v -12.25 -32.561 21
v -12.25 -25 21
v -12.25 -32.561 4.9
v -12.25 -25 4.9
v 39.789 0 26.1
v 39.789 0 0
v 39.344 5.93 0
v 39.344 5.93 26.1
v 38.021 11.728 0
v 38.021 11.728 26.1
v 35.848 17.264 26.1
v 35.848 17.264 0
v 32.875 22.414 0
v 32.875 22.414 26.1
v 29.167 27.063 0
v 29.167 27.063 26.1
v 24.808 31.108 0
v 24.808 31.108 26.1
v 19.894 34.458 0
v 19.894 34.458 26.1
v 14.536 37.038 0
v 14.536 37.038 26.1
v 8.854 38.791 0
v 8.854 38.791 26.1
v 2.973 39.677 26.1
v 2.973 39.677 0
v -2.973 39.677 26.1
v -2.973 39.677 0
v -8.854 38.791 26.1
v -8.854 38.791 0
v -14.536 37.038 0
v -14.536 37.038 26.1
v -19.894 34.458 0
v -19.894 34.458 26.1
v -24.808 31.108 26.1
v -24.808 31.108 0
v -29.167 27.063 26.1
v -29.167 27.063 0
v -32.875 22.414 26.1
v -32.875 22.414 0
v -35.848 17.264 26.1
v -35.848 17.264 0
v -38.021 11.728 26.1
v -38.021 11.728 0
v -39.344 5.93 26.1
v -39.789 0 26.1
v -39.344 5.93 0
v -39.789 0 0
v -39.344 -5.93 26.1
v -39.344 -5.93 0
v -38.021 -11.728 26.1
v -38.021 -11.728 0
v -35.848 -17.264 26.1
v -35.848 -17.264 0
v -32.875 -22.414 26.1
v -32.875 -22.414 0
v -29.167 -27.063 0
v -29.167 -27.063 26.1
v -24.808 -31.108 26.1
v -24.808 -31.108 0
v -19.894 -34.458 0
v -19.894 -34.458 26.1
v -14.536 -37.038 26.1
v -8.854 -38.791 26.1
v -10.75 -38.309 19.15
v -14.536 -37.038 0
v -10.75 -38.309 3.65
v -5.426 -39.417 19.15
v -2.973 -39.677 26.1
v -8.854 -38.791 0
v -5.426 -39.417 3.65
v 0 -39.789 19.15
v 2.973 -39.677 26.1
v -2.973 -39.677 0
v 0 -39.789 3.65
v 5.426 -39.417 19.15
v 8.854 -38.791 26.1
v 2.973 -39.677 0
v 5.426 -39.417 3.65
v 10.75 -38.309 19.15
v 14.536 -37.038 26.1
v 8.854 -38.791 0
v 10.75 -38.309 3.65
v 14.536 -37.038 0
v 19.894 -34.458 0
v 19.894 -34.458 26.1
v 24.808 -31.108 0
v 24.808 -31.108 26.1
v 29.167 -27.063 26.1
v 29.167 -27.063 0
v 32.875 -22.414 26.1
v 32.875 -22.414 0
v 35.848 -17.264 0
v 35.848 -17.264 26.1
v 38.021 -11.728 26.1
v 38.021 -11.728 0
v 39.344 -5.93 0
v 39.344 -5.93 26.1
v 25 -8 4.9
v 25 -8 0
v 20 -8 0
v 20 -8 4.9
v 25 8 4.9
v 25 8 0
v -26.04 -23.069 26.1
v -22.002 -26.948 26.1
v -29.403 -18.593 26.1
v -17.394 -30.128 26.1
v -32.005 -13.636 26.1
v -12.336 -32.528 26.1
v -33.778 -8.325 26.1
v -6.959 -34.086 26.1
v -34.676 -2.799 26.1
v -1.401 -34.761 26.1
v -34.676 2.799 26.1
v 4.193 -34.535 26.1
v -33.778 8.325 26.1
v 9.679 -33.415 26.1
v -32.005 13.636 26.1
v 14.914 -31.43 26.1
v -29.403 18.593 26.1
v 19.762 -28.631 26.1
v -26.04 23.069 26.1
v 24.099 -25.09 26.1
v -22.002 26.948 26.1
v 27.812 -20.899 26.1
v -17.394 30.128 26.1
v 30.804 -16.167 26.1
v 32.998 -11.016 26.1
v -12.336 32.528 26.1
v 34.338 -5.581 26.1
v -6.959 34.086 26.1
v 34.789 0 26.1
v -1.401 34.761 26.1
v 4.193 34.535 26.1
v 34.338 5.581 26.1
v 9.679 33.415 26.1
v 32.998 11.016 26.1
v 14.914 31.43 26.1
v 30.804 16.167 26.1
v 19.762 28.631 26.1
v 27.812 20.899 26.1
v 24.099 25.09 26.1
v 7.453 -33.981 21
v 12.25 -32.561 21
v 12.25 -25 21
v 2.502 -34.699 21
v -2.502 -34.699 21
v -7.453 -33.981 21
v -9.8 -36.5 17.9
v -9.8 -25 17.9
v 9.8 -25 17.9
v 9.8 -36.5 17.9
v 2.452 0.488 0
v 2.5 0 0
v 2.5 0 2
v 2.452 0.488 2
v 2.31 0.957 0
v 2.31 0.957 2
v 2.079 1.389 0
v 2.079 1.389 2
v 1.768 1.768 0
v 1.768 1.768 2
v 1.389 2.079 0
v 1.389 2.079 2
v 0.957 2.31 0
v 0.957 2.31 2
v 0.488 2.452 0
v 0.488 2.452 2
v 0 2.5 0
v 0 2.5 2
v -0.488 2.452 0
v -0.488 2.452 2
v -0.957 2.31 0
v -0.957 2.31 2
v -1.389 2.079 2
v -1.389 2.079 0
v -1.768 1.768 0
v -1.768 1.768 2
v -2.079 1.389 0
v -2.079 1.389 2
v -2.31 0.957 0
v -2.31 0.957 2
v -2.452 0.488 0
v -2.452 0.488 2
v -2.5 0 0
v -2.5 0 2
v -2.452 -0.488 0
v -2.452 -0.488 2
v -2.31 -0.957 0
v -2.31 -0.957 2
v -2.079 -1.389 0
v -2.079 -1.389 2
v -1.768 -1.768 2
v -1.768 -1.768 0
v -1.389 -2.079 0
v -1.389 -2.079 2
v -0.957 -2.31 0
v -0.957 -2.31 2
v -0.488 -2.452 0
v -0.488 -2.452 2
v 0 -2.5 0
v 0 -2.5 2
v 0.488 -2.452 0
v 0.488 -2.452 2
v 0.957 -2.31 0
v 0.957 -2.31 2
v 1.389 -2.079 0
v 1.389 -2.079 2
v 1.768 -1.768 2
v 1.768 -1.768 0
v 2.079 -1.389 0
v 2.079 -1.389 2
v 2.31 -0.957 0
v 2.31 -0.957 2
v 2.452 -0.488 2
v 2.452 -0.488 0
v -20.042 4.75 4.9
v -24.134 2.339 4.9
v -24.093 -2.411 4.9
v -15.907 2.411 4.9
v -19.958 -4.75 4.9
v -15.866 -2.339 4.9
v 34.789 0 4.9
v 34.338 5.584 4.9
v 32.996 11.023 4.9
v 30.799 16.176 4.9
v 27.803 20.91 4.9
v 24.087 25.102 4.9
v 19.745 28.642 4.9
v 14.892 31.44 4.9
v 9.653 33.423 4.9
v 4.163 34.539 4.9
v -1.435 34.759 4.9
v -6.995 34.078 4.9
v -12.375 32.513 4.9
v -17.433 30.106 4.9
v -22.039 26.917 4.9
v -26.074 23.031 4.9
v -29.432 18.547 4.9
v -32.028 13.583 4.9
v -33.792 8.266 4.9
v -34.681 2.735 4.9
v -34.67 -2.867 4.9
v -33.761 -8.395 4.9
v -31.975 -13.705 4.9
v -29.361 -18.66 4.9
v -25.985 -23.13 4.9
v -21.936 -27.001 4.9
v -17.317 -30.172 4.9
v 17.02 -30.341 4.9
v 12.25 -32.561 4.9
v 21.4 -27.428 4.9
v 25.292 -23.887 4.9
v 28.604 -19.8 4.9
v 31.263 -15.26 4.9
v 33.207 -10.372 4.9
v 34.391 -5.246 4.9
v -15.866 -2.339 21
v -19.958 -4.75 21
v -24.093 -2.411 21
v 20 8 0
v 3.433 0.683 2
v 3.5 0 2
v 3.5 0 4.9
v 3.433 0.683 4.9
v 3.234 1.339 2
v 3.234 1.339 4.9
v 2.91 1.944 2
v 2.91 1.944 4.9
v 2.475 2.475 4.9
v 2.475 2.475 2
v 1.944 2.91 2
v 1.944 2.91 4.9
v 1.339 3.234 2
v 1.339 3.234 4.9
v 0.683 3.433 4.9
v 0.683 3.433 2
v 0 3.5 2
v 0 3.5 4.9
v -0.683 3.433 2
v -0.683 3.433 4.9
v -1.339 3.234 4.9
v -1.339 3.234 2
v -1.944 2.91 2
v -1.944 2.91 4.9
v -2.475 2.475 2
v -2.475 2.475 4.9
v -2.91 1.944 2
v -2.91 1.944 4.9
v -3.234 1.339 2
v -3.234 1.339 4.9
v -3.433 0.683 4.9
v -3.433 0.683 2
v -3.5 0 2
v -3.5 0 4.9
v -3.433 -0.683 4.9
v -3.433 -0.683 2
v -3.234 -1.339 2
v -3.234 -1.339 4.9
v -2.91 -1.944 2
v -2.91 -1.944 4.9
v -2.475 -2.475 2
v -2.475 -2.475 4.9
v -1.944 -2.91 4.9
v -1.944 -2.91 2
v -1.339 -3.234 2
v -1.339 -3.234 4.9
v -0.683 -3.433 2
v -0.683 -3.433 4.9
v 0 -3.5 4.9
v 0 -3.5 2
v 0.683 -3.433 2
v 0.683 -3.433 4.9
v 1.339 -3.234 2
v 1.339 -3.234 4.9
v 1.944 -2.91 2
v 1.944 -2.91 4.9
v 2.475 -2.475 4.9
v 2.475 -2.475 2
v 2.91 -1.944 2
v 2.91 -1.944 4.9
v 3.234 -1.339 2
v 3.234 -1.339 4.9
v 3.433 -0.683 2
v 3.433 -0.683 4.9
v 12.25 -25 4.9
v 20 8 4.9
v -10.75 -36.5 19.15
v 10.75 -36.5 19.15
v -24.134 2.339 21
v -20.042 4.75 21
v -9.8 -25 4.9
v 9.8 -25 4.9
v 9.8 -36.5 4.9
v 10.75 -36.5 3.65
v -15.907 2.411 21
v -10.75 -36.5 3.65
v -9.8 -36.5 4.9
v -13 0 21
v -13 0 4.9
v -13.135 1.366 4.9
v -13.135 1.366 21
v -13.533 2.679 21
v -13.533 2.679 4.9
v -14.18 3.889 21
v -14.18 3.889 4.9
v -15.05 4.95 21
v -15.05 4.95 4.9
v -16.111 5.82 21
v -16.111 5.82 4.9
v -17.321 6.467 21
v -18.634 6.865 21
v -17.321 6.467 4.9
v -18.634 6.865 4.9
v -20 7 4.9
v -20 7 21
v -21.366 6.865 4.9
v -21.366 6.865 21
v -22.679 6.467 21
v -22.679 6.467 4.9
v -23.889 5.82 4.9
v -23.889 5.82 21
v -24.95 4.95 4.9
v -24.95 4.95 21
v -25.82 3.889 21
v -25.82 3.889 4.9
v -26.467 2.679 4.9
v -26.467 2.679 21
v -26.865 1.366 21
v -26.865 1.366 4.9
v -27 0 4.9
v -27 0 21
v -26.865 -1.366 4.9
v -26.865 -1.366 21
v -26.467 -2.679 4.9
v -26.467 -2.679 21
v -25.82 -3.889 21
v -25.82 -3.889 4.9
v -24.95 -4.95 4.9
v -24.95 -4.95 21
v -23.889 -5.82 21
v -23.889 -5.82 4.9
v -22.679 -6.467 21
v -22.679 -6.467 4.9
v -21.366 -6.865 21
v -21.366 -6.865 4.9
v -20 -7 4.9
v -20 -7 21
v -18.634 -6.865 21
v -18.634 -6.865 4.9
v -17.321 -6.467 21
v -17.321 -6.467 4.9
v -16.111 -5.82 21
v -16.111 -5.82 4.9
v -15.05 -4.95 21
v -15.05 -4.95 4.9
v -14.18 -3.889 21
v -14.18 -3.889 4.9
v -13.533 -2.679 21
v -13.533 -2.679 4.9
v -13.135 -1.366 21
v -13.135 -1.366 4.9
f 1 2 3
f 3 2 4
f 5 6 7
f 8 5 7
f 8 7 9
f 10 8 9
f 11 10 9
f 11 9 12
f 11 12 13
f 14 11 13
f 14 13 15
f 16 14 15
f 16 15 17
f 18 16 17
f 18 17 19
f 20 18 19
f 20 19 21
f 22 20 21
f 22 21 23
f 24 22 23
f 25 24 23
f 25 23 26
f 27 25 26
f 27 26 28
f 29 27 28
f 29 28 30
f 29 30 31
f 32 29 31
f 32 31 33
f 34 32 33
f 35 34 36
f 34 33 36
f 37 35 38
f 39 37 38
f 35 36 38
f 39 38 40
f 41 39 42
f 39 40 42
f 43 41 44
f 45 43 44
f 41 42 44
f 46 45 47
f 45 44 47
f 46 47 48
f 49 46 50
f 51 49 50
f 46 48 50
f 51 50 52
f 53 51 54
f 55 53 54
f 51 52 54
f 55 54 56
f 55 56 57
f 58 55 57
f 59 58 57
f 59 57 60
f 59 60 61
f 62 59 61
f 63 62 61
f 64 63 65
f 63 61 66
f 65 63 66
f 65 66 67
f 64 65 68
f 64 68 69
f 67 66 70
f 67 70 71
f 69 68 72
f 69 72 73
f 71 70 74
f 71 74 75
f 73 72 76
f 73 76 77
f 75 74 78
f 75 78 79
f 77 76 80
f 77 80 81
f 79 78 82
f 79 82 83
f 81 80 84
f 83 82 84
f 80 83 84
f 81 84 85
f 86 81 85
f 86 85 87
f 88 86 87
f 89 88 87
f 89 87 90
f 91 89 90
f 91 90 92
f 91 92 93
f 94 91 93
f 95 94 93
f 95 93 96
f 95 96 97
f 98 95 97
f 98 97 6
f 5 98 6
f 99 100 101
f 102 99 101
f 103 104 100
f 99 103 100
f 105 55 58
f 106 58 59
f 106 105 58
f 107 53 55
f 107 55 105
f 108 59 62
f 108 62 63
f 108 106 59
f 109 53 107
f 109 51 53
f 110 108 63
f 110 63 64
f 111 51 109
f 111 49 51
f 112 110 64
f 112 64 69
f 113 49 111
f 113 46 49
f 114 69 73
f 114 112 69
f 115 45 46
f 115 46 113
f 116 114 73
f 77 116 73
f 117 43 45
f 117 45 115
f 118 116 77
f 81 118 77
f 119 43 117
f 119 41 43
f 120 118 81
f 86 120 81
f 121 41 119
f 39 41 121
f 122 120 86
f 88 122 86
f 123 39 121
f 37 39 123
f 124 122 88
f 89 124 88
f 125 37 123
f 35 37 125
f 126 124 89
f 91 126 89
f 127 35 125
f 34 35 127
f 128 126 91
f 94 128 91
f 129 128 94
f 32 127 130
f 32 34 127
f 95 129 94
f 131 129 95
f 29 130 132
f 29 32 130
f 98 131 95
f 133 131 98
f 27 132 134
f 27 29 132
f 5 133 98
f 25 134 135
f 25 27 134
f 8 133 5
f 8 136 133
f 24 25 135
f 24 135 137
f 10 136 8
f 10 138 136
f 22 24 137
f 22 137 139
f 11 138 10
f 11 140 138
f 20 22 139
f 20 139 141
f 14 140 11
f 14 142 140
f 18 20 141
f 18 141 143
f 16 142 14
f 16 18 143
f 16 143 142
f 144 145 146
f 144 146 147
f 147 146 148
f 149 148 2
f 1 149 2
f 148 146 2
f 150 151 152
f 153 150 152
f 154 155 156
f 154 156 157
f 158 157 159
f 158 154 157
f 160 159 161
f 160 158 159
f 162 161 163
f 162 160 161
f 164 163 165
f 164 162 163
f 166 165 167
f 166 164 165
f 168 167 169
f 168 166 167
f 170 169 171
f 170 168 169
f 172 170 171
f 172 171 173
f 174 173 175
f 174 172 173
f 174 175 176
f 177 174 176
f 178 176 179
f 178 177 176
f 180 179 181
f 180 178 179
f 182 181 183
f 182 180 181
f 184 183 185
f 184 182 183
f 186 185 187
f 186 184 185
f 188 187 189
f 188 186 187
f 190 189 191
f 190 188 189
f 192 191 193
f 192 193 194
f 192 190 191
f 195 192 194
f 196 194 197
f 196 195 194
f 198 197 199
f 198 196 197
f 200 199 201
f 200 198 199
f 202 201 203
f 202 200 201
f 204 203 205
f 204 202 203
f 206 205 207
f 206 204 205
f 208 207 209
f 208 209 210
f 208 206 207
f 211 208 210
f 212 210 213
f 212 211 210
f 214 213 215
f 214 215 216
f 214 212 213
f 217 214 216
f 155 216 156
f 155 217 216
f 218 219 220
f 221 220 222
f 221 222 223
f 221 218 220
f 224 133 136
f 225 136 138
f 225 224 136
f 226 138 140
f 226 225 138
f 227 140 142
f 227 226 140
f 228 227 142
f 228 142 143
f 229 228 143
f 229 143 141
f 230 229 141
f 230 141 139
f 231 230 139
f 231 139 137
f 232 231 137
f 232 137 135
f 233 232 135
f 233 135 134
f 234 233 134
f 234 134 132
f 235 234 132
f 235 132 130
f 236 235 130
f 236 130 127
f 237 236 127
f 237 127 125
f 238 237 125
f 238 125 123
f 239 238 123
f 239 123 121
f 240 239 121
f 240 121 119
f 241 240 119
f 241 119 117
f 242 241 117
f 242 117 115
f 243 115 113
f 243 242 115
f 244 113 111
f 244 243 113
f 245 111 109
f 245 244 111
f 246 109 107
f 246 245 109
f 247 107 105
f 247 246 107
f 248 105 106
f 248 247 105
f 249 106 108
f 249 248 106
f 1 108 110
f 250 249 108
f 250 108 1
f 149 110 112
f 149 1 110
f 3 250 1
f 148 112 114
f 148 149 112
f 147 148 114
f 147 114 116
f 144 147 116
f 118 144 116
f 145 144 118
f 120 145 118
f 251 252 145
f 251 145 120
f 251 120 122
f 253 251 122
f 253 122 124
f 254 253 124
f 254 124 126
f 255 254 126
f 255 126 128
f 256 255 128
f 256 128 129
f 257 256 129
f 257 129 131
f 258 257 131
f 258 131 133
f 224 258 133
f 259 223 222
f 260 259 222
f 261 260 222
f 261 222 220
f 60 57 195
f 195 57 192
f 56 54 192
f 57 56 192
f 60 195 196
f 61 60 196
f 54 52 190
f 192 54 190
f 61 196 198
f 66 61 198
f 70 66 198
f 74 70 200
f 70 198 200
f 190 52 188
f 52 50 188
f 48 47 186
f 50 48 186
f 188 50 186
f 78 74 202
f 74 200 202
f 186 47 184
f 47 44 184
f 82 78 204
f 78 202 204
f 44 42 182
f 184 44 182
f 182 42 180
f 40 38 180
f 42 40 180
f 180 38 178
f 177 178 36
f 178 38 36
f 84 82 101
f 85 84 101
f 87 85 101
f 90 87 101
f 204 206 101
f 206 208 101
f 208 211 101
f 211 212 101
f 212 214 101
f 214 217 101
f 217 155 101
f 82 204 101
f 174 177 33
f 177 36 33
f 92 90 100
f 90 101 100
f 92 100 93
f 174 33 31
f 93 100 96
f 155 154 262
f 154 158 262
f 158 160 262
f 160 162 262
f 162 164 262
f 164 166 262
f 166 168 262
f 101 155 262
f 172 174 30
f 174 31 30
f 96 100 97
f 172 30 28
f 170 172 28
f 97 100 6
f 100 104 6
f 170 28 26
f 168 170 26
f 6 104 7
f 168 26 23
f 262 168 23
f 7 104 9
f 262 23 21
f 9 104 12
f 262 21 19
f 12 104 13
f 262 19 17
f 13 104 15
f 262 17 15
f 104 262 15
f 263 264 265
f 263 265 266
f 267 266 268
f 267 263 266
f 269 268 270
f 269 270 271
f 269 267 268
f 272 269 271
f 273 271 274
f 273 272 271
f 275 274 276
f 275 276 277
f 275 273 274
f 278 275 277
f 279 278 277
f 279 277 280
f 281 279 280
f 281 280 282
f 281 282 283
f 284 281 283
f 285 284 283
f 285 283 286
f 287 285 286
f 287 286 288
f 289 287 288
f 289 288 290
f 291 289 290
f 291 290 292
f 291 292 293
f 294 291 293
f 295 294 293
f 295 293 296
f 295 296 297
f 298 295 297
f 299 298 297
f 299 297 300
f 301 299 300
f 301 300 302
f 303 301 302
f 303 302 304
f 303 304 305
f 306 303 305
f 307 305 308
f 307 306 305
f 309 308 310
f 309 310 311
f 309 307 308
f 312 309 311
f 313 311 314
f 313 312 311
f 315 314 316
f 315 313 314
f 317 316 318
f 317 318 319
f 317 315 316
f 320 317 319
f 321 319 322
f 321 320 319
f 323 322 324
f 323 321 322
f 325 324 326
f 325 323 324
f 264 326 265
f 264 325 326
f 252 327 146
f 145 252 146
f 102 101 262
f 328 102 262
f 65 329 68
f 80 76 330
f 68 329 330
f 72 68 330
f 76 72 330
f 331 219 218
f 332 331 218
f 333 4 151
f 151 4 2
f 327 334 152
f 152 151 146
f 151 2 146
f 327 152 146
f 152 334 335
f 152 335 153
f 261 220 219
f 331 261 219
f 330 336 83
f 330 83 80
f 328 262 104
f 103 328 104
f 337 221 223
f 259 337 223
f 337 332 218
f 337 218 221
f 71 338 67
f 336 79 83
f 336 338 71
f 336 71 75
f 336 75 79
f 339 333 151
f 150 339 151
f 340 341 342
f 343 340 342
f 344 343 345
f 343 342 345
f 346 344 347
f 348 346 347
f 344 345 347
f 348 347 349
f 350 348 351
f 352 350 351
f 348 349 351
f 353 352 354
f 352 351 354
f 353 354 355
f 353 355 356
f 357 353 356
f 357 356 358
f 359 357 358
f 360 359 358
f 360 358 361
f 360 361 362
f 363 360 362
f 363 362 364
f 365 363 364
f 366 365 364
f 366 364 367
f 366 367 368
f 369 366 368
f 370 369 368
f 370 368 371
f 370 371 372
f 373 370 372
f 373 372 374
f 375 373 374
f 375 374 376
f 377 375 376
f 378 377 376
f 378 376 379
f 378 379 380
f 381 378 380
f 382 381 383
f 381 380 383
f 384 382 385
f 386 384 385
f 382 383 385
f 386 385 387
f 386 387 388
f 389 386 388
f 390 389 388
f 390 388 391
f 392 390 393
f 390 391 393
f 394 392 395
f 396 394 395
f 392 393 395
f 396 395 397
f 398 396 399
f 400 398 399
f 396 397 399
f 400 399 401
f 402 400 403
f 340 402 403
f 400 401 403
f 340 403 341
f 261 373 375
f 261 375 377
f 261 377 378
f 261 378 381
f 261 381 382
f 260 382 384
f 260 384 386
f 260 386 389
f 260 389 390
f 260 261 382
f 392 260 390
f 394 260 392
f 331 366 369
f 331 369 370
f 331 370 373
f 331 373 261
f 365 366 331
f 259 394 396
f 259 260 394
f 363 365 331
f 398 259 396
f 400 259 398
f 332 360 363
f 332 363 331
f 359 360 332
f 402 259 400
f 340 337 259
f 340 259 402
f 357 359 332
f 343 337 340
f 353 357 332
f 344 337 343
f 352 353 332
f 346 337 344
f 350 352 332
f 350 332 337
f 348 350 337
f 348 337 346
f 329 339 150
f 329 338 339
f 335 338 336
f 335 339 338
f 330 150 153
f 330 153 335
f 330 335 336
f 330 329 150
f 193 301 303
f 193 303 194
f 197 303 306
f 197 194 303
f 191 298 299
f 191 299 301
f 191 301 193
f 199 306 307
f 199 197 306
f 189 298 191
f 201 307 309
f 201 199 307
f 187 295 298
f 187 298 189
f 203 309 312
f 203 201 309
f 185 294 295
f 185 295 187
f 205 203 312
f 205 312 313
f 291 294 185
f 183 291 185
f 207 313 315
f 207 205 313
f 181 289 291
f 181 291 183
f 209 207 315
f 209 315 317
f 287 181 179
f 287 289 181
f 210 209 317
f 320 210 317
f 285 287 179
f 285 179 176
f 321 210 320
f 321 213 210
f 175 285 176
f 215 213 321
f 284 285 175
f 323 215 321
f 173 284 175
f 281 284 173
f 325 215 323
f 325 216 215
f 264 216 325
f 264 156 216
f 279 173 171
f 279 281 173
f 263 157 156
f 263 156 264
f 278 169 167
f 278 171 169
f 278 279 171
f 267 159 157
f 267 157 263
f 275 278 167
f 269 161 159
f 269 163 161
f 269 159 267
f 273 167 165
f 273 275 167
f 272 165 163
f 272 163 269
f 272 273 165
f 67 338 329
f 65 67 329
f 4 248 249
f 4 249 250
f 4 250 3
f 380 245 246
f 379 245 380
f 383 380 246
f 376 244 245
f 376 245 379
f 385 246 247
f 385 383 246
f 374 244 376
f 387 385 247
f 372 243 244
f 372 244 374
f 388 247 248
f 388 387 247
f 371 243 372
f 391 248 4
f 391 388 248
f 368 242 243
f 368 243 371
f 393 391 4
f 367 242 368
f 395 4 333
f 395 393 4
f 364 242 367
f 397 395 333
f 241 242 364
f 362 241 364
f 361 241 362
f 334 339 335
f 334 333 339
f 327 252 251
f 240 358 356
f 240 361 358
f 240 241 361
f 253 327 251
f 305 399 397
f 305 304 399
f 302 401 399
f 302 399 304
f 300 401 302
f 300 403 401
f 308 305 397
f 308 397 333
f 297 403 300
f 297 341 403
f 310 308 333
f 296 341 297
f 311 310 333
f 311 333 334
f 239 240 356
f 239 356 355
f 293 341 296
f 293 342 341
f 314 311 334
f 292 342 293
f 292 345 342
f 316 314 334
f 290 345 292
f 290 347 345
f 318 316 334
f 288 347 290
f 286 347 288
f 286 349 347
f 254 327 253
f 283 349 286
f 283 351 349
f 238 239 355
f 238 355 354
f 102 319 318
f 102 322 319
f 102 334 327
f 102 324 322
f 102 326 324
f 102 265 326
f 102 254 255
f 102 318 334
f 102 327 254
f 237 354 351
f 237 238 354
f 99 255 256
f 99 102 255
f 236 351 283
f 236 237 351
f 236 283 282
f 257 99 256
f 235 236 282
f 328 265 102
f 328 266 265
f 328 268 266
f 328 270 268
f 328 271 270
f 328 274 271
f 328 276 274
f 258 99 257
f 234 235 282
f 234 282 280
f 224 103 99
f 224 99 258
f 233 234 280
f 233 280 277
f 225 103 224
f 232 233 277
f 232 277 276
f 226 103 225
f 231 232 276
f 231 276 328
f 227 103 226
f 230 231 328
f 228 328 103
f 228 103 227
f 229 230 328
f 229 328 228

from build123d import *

# Parameters (mm, degrees)
F0_R     = 39.78873575
F0_R_2   = 34.78873575
F1_DEPTH = 26.1
F0_R_3   = 7
F0_R_4   = 3.5
F2_DEPTH = 4.9
F0_R_5   = 2.5
F3_DEPTH = 2
F4_DEPTH = 21
F6_START = 25
F5_W     = 19.6
F5_H     = 13
F6_DEPTH = 20
F7_START = 36.5
F5_W_2   = 21.5
F5_H_2   = 15.5
F7_DEPTH = 8.5
F8_START = 25
F8_DEPTH = 11.5
F9_START = 25
F9_DEPTH = 11.5


# Not quite as in the source:
# - a feature names something its author has since deleted; it is built from what else it names


with BuildPart() as f1:
    # F0 (on Top) → F1 (new body)
    with BuildSketch(Plane.XY):
        Circle(F0_R)
        Circle(F0_R_2, mode=Mode.SUBTRACT)
    extrude(amount=F1_DEPTH)

    # F0 (on Top) → F2 (join)
    with BuildSketch(Plane.XY):
        Circle(F0_R_2)
        with Locations((-20, 0)):
            Circle(F0_R_3, mode=Mode.SUBTRACT)
        Circle(F0_R_4, mode=Mode.SUBTRACT)
        Polygon((20, 4.1030999273), (20, 8), (25, 8), (25, 5), (25, -5), (25, -8), (20, -8), (20, -4.1030999273), align=None, mode=Mode.SUBTRACT)
    extrude(amount=F2_DEPTH)

    # F0 (on Top) → F3 (join)
    with BuildSketch(Plane.XY):
        Circle(F0_R_4)
        Circle(F0_R_5, mode=Mode.SUBTRACT)
    extrude(amount=F3_DEPTH)



with BuildPart() as f2:
    # F0 (on Top) → F2, piece 2 (new body)
    with BuildSketch(Plane.XY):
        Polygon((-24.1344178899, 2.3386082852), (-24.0925031294, -2.4112067799), (-19.9580852395, -4.7498150651), (-15.8655821101, -2.3386082852), (-15.9074968706, 2.4112067799), (-20.0419147605, 4.7498150651), align=None)
    extrude(amount=F2_DEPTH)


with BuildPart() as f1_1:
    add(f1.part)

    add(f2.part)  # F4 merges F2
    # F0 (on Top) → F4 (join)
    with BuildSketch(Plane.XY):
        with Locations((-20, 0)):
            Circle(F0_R_3)
        Polygon((-19.9580852395, -4.7498150651), (-24.0925031294, -2.4112067799), (-24.1344178899, 2.3386082852), (-20.0419147605, 4.7498150651), (-15.9074968706, 2.4112067799), (-15.8655821101, -2.3386082852), align=None, mode=Mode.SUBTRACT)
    extrude(amount=F4_DEPTH)

    # F5 (on Front) → F6 (cut)
    with BuildSketch(Plane.XZ.offset(F6_START)):
        with Locations((0, 11.4)):
            Rectangle(F5_W, F5_H)
    extrude(amount=F6_DEPTH, mode=Mode.SUBTRACT)

    # F5 (on Front) → F7 (cut)
    with BuildSketch(Plane.XZ.offset(F7_START)):
        with Locations((0, 11.4)):
            Rectangle(F5_W_2, F5_H_2)
        with Locations((0, 11.4)):
            Rectangle(F5_W, F5_H, mode=Mode.SUBTRACT)
    extrude(amount=F7_DEPTH, mode=Mode.SUBTRACT)

    # F5 (on Front) → F8 (join)
    with BuildSketch(Plane.XZ.offset(F8_START)):
        with Locations((0, 11.4)):
            Rectangle(F5_W_2, F5_H_2)
        with Locations((0, 11.4)):
            Rectangle(F5_W, F5_H, mode=Mode.SUBTRACT)
    extrude(amount=F8_DEPTH)

    # F5 (on Front) → F9 (join)
    with BuildSketch(Plane.XZ.offset(F9_START)):
        Polygon((-10.75, 3.65), (-10.75, 19.15), (10.75, 19.15), (10.75, 3.65), (12.25, 3.65), (12.25, 21), (-12.25, 21), (-12.25, 3.65), align=None)
    extrude(amount=F9_DEPTH)


solid = f1_1.part
